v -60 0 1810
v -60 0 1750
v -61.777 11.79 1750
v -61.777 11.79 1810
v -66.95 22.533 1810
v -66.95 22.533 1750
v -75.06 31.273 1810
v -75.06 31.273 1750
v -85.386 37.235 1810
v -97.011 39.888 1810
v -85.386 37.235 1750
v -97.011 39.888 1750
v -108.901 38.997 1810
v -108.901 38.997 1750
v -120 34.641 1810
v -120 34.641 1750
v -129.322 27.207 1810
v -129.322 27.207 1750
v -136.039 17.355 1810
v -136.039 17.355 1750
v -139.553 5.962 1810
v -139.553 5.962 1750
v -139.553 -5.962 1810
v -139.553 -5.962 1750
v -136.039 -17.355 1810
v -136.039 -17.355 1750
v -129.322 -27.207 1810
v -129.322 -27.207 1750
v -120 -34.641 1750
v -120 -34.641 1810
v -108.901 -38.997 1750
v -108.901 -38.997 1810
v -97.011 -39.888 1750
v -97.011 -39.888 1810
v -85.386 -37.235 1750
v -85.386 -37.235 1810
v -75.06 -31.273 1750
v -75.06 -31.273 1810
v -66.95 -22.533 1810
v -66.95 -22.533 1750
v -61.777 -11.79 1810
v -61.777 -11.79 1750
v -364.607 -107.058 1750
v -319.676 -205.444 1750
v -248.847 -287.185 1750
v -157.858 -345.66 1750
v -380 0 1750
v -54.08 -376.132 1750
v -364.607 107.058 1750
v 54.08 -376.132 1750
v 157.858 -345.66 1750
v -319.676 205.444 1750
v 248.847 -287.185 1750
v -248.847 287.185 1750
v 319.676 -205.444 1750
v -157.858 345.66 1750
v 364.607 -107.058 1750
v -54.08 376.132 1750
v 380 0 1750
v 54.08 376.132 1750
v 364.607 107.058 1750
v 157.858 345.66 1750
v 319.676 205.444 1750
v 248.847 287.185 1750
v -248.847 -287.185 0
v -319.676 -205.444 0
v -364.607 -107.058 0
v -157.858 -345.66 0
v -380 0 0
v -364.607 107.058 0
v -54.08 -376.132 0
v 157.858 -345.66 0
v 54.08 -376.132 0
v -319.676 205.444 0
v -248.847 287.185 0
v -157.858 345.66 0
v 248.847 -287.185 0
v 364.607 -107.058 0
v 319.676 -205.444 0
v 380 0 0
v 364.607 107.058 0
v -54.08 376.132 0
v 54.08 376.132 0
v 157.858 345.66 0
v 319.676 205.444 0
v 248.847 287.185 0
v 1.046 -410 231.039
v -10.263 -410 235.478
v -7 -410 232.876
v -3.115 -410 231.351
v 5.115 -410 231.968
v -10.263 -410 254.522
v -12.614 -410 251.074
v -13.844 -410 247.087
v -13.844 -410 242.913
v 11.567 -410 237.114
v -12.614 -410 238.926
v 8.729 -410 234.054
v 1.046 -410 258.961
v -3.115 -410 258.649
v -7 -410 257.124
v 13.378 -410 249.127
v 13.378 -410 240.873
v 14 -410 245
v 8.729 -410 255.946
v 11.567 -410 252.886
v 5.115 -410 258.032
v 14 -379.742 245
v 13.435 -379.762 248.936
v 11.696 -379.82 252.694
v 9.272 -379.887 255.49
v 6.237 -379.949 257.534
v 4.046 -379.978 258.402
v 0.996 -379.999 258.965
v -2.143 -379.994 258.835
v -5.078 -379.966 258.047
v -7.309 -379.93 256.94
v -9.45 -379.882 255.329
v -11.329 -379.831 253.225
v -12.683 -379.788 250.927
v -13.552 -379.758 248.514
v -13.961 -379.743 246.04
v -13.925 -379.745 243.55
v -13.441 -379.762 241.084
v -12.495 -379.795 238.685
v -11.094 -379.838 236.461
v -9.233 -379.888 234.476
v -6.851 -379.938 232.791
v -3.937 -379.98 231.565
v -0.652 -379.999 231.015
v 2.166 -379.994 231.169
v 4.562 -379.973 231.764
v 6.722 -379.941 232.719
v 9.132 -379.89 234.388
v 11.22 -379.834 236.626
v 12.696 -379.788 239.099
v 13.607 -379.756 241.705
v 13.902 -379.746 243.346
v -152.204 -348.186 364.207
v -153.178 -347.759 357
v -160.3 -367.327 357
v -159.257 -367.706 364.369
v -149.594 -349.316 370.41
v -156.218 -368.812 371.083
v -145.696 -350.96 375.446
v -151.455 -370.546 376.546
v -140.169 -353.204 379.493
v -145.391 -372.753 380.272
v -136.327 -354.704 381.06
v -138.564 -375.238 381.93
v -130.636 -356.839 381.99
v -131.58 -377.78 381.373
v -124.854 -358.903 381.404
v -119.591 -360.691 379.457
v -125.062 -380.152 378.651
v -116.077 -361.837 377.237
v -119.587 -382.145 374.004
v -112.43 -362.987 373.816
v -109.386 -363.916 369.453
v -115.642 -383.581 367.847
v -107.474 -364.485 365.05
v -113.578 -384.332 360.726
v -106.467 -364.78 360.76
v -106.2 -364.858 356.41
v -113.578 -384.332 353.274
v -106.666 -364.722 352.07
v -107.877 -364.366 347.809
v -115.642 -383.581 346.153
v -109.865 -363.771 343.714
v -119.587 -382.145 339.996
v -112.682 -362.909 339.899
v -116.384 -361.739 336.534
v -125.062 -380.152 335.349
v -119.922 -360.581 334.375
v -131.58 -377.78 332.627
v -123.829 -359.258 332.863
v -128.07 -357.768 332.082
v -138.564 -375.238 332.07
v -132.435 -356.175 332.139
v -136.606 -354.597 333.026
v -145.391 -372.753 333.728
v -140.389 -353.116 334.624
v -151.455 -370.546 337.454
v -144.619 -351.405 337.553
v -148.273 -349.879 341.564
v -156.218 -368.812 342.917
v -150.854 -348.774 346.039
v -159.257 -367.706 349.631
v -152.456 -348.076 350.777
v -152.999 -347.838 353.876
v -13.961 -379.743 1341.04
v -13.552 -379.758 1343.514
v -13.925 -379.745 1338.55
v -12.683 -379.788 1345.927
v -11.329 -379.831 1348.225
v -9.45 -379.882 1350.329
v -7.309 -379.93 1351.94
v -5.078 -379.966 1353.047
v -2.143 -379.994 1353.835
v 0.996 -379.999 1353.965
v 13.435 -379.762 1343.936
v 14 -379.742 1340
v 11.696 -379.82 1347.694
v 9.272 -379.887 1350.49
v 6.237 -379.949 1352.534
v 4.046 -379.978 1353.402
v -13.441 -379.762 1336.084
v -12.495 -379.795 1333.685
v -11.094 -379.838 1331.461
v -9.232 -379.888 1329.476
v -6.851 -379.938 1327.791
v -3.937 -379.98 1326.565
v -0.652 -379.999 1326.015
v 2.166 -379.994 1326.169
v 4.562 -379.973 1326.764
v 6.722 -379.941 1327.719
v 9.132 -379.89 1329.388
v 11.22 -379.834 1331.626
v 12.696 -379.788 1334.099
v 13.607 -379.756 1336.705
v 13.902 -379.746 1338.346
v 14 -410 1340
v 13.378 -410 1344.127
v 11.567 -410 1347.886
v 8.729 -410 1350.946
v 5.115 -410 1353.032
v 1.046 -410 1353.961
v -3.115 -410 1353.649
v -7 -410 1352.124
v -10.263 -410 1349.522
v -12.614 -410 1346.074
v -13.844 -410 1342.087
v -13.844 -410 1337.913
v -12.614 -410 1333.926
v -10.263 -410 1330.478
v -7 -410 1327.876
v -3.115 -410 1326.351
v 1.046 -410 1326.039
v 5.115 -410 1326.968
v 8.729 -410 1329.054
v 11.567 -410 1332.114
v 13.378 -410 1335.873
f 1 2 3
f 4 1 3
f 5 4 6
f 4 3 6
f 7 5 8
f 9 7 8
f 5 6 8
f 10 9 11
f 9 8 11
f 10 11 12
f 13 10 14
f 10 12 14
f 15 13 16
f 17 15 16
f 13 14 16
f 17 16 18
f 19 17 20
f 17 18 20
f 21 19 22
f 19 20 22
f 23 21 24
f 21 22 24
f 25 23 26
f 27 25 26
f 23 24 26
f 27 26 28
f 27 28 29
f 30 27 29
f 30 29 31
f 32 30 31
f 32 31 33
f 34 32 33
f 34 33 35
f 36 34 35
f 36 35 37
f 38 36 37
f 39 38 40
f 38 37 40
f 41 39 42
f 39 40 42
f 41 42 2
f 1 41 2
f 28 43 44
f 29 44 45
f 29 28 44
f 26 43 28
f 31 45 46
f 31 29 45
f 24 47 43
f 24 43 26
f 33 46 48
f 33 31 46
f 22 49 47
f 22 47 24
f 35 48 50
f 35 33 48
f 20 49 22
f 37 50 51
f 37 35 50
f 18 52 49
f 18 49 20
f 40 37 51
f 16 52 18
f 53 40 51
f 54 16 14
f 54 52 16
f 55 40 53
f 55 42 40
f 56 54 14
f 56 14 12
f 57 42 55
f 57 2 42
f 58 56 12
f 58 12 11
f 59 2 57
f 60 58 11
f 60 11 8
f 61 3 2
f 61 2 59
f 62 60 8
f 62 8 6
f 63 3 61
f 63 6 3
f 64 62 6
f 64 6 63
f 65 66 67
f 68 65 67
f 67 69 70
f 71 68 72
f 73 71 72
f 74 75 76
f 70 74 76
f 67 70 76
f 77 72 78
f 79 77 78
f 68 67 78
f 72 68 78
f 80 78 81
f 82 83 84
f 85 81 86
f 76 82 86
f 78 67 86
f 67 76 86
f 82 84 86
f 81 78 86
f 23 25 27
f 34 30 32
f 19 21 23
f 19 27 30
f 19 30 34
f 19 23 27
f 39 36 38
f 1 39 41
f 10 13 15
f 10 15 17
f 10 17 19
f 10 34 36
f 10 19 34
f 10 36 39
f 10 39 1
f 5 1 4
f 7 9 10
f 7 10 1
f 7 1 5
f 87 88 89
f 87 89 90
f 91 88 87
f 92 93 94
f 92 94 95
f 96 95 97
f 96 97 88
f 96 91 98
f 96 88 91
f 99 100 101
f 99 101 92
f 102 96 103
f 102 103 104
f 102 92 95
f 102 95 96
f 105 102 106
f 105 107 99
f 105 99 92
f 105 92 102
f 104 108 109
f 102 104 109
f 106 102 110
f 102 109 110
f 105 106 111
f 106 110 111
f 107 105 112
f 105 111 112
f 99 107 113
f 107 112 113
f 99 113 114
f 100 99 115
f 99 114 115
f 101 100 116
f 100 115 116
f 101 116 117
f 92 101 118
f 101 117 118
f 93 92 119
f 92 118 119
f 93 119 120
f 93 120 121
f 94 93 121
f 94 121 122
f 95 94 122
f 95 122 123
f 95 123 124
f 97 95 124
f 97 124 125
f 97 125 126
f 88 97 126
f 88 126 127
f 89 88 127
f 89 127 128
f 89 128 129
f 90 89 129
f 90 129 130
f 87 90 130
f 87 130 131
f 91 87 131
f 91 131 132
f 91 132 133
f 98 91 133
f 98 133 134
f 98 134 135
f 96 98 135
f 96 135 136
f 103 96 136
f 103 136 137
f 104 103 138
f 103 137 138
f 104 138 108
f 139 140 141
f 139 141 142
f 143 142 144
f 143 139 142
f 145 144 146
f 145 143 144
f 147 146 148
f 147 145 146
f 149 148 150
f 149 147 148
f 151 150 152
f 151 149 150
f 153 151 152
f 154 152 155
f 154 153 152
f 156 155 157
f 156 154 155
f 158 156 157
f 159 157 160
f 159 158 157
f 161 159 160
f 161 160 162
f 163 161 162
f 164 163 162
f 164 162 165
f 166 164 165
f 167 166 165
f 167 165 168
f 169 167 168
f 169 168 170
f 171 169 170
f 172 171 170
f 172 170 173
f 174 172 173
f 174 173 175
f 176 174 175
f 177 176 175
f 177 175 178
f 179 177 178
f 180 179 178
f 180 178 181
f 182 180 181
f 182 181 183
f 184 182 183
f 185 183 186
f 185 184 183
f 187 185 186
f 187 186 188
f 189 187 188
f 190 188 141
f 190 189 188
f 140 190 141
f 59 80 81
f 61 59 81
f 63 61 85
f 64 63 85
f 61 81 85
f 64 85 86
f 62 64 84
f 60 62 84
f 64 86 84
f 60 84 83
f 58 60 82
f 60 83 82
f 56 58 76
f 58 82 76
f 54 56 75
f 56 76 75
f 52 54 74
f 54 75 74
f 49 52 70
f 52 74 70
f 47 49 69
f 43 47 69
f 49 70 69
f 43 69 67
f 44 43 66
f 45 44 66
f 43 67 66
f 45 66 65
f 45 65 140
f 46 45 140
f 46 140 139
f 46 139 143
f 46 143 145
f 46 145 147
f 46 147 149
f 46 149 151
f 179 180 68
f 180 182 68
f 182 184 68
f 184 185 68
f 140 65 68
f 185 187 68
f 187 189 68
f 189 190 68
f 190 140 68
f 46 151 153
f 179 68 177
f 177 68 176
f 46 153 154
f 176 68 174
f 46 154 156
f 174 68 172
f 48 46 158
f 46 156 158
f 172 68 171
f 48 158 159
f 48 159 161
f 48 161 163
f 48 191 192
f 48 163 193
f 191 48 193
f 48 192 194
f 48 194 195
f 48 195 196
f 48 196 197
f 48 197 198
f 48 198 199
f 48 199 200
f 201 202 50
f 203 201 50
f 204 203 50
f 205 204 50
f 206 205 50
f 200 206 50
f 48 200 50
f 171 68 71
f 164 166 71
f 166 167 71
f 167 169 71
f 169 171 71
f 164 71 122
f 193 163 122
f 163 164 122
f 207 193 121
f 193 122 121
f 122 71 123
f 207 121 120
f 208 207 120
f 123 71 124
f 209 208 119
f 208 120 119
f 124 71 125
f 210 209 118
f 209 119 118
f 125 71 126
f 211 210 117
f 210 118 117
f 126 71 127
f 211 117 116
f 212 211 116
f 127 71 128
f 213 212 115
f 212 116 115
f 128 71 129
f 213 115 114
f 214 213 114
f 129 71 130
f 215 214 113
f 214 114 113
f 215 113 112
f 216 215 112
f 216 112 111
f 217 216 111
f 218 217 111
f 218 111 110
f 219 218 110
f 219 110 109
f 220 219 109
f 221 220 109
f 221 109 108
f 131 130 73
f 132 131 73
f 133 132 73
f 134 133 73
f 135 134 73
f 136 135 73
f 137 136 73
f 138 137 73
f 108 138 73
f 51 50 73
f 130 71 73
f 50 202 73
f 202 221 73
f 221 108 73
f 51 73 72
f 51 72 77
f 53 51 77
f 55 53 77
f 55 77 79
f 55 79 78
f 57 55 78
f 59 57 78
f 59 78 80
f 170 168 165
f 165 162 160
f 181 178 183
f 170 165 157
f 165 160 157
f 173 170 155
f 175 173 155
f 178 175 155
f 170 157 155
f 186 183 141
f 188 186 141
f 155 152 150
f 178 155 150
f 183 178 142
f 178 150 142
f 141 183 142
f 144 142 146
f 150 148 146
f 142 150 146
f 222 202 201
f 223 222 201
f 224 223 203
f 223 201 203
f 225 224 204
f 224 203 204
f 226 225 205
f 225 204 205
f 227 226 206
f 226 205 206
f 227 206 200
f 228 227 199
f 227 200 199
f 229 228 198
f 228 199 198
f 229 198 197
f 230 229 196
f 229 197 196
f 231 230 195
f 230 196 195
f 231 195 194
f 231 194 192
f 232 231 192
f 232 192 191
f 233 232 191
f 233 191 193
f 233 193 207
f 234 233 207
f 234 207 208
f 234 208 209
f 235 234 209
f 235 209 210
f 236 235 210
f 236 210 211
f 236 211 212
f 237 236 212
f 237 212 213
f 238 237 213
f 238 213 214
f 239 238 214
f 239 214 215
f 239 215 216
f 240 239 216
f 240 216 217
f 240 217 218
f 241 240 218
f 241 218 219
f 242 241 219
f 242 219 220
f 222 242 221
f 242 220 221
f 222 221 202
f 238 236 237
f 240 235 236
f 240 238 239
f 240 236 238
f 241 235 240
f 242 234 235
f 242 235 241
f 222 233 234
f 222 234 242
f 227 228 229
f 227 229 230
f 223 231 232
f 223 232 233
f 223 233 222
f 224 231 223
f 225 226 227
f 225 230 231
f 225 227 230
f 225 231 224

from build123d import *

# Parameters (mm, degrees)
F0_R     = 380
F1_DEPTH = 1750
F2_R     = 14
F3_DEPTH = 410
F4_R     = 40
F5_DEPTH = 60
F8_R     = 25
F9_DEPTH = 400


with BuildPart() as f1:
    # F0 (on Top) → F1 (new body)
    with BuildSketch(Plane.XY):
        Circle(F0_R)
    extrude(amount=F1_DEPTH)

    # F2 (on Front) → F3 (join)
    with BuildSketch(Plane.XZ):
        with Locations((0, 245)):
            Circle(F2_R)
        with Locations((0, 1340)):
            Circle(F2_R)
    extrude(amount=F3_DEPTH)

    # F4 (on face) → F5 (join)
    with BuildSketch(Plane.XY.offset(1750)):
        with Locations((-100, 0)):
            Circle(F4_R)
    extrude(amount=F5_DEPTH)

    # F8 (on face) → F9 (join)
    with BuildSketch(Plane(origin=(0, 0, 0), x_dir=(-0.939693, 0.34202, 0), z_dir=(0.34202, 0.939693, 0))):
        with Locations((0, 357)):
            Circle(F8_R)
    extrude(amount=-F9_DEPTH)


solid = f1.part
